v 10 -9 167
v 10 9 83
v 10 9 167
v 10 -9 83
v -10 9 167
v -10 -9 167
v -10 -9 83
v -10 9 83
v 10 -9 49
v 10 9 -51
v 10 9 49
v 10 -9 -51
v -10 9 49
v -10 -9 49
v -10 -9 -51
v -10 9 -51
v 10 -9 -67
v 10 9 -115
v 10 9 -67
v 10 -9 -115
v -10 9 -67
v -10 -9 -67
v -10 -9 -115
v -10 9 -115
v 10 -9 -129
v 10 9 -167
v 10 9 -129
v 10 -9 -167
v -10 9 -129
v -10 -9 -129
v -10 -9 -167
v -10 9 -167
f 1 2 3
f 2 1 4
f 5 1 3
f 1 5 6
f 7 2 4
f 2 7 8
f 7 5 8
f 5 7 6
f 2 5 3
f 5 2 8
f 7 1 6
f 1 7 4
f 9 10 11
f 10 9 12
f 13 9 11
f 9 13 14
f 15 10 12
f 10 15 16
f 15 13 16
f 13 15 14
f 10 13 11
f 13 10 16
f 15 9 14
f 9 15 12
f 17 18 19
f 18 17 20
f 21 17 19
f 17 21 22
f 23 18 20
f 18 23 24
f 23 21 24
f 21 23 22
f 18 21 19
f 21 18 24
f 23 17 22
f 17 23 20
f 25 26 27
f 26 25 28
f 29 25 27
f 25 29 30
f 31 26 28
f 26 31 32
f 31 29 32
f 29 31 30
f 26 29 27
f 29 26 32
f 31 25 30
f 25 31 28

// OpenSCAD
// ============================================================================
// Atom Lithography Machine — Parametric OpenSCAD Module (S6.4-03)
// ============================================================================
// part_id           : S6.4-03
// parent_bom_id     : S6.4
// subsystem         : S6
// part_name         : Kriyojenik mikrodalga surus koaksiyel hatlari ve termalize zayiflaticilar
// material          : CuNi
// temp_stage        : 300 K -> 20 mK
// vacuum_grade      : Kriyo-vakum
// tolerance         : ±1 dB
// computed_mass_kg  : 0.20136
// envelope_mm       : 20.000 x 18.000 x 334.000
// design_maturity   : M0_M1_DETAILED_CAD_DESIGN_ONLY
// no_lab_measurement: true
// iec61508_certified: false
// semi_s2_certified : false
// Units: millimeters (mm)
// ============================================================================

$fn = 64;

// Nominal bounding envelope parameters (mm)
bbox_x = 20.0000;
bbox_y = 18.0000;
bbox_z = 334.0000;

// Part-specific parametric dimensions
n_lines = 8;
atten_db = 60.0;
f_max_ghz = 40.0;

// Interface / port parameters (mm)

module part_S6_4_03() {
  union() {
    // Stage 50k_4k thermalized cryo coax loom (8 lines)
    translate([0.000, 0.000, 125.000]) cube([20.000, 18.000, 84.000], center=true);
    // Stage 4k_still thermalized cryo coax loom (8 lines)
    translate([0.000, 0.000, -1.000]) cube([20.000, 18.000, 100.000], center=true);
    // Stage still_cp thermalized cryo coax loom (8 lines)
    translate([0.000, 0.000, -91.000]) cube([20.000, 18.000, 48.000], center=true);
    // Stage cp_mxc thermalized cryo coax loom (8 lines)
    translate([0.000, 0.000, -148.000]) cube([20.000, 18.000, 38.000], center=true);
  }
}

// World assembly mounting transform (global machine frame, mm / deg):
// translate([-588.000, 40.000, 669.000]) rotate([0.000, 0.000, 0.000]) part_S6_4_03();

part_S6_4_03();
